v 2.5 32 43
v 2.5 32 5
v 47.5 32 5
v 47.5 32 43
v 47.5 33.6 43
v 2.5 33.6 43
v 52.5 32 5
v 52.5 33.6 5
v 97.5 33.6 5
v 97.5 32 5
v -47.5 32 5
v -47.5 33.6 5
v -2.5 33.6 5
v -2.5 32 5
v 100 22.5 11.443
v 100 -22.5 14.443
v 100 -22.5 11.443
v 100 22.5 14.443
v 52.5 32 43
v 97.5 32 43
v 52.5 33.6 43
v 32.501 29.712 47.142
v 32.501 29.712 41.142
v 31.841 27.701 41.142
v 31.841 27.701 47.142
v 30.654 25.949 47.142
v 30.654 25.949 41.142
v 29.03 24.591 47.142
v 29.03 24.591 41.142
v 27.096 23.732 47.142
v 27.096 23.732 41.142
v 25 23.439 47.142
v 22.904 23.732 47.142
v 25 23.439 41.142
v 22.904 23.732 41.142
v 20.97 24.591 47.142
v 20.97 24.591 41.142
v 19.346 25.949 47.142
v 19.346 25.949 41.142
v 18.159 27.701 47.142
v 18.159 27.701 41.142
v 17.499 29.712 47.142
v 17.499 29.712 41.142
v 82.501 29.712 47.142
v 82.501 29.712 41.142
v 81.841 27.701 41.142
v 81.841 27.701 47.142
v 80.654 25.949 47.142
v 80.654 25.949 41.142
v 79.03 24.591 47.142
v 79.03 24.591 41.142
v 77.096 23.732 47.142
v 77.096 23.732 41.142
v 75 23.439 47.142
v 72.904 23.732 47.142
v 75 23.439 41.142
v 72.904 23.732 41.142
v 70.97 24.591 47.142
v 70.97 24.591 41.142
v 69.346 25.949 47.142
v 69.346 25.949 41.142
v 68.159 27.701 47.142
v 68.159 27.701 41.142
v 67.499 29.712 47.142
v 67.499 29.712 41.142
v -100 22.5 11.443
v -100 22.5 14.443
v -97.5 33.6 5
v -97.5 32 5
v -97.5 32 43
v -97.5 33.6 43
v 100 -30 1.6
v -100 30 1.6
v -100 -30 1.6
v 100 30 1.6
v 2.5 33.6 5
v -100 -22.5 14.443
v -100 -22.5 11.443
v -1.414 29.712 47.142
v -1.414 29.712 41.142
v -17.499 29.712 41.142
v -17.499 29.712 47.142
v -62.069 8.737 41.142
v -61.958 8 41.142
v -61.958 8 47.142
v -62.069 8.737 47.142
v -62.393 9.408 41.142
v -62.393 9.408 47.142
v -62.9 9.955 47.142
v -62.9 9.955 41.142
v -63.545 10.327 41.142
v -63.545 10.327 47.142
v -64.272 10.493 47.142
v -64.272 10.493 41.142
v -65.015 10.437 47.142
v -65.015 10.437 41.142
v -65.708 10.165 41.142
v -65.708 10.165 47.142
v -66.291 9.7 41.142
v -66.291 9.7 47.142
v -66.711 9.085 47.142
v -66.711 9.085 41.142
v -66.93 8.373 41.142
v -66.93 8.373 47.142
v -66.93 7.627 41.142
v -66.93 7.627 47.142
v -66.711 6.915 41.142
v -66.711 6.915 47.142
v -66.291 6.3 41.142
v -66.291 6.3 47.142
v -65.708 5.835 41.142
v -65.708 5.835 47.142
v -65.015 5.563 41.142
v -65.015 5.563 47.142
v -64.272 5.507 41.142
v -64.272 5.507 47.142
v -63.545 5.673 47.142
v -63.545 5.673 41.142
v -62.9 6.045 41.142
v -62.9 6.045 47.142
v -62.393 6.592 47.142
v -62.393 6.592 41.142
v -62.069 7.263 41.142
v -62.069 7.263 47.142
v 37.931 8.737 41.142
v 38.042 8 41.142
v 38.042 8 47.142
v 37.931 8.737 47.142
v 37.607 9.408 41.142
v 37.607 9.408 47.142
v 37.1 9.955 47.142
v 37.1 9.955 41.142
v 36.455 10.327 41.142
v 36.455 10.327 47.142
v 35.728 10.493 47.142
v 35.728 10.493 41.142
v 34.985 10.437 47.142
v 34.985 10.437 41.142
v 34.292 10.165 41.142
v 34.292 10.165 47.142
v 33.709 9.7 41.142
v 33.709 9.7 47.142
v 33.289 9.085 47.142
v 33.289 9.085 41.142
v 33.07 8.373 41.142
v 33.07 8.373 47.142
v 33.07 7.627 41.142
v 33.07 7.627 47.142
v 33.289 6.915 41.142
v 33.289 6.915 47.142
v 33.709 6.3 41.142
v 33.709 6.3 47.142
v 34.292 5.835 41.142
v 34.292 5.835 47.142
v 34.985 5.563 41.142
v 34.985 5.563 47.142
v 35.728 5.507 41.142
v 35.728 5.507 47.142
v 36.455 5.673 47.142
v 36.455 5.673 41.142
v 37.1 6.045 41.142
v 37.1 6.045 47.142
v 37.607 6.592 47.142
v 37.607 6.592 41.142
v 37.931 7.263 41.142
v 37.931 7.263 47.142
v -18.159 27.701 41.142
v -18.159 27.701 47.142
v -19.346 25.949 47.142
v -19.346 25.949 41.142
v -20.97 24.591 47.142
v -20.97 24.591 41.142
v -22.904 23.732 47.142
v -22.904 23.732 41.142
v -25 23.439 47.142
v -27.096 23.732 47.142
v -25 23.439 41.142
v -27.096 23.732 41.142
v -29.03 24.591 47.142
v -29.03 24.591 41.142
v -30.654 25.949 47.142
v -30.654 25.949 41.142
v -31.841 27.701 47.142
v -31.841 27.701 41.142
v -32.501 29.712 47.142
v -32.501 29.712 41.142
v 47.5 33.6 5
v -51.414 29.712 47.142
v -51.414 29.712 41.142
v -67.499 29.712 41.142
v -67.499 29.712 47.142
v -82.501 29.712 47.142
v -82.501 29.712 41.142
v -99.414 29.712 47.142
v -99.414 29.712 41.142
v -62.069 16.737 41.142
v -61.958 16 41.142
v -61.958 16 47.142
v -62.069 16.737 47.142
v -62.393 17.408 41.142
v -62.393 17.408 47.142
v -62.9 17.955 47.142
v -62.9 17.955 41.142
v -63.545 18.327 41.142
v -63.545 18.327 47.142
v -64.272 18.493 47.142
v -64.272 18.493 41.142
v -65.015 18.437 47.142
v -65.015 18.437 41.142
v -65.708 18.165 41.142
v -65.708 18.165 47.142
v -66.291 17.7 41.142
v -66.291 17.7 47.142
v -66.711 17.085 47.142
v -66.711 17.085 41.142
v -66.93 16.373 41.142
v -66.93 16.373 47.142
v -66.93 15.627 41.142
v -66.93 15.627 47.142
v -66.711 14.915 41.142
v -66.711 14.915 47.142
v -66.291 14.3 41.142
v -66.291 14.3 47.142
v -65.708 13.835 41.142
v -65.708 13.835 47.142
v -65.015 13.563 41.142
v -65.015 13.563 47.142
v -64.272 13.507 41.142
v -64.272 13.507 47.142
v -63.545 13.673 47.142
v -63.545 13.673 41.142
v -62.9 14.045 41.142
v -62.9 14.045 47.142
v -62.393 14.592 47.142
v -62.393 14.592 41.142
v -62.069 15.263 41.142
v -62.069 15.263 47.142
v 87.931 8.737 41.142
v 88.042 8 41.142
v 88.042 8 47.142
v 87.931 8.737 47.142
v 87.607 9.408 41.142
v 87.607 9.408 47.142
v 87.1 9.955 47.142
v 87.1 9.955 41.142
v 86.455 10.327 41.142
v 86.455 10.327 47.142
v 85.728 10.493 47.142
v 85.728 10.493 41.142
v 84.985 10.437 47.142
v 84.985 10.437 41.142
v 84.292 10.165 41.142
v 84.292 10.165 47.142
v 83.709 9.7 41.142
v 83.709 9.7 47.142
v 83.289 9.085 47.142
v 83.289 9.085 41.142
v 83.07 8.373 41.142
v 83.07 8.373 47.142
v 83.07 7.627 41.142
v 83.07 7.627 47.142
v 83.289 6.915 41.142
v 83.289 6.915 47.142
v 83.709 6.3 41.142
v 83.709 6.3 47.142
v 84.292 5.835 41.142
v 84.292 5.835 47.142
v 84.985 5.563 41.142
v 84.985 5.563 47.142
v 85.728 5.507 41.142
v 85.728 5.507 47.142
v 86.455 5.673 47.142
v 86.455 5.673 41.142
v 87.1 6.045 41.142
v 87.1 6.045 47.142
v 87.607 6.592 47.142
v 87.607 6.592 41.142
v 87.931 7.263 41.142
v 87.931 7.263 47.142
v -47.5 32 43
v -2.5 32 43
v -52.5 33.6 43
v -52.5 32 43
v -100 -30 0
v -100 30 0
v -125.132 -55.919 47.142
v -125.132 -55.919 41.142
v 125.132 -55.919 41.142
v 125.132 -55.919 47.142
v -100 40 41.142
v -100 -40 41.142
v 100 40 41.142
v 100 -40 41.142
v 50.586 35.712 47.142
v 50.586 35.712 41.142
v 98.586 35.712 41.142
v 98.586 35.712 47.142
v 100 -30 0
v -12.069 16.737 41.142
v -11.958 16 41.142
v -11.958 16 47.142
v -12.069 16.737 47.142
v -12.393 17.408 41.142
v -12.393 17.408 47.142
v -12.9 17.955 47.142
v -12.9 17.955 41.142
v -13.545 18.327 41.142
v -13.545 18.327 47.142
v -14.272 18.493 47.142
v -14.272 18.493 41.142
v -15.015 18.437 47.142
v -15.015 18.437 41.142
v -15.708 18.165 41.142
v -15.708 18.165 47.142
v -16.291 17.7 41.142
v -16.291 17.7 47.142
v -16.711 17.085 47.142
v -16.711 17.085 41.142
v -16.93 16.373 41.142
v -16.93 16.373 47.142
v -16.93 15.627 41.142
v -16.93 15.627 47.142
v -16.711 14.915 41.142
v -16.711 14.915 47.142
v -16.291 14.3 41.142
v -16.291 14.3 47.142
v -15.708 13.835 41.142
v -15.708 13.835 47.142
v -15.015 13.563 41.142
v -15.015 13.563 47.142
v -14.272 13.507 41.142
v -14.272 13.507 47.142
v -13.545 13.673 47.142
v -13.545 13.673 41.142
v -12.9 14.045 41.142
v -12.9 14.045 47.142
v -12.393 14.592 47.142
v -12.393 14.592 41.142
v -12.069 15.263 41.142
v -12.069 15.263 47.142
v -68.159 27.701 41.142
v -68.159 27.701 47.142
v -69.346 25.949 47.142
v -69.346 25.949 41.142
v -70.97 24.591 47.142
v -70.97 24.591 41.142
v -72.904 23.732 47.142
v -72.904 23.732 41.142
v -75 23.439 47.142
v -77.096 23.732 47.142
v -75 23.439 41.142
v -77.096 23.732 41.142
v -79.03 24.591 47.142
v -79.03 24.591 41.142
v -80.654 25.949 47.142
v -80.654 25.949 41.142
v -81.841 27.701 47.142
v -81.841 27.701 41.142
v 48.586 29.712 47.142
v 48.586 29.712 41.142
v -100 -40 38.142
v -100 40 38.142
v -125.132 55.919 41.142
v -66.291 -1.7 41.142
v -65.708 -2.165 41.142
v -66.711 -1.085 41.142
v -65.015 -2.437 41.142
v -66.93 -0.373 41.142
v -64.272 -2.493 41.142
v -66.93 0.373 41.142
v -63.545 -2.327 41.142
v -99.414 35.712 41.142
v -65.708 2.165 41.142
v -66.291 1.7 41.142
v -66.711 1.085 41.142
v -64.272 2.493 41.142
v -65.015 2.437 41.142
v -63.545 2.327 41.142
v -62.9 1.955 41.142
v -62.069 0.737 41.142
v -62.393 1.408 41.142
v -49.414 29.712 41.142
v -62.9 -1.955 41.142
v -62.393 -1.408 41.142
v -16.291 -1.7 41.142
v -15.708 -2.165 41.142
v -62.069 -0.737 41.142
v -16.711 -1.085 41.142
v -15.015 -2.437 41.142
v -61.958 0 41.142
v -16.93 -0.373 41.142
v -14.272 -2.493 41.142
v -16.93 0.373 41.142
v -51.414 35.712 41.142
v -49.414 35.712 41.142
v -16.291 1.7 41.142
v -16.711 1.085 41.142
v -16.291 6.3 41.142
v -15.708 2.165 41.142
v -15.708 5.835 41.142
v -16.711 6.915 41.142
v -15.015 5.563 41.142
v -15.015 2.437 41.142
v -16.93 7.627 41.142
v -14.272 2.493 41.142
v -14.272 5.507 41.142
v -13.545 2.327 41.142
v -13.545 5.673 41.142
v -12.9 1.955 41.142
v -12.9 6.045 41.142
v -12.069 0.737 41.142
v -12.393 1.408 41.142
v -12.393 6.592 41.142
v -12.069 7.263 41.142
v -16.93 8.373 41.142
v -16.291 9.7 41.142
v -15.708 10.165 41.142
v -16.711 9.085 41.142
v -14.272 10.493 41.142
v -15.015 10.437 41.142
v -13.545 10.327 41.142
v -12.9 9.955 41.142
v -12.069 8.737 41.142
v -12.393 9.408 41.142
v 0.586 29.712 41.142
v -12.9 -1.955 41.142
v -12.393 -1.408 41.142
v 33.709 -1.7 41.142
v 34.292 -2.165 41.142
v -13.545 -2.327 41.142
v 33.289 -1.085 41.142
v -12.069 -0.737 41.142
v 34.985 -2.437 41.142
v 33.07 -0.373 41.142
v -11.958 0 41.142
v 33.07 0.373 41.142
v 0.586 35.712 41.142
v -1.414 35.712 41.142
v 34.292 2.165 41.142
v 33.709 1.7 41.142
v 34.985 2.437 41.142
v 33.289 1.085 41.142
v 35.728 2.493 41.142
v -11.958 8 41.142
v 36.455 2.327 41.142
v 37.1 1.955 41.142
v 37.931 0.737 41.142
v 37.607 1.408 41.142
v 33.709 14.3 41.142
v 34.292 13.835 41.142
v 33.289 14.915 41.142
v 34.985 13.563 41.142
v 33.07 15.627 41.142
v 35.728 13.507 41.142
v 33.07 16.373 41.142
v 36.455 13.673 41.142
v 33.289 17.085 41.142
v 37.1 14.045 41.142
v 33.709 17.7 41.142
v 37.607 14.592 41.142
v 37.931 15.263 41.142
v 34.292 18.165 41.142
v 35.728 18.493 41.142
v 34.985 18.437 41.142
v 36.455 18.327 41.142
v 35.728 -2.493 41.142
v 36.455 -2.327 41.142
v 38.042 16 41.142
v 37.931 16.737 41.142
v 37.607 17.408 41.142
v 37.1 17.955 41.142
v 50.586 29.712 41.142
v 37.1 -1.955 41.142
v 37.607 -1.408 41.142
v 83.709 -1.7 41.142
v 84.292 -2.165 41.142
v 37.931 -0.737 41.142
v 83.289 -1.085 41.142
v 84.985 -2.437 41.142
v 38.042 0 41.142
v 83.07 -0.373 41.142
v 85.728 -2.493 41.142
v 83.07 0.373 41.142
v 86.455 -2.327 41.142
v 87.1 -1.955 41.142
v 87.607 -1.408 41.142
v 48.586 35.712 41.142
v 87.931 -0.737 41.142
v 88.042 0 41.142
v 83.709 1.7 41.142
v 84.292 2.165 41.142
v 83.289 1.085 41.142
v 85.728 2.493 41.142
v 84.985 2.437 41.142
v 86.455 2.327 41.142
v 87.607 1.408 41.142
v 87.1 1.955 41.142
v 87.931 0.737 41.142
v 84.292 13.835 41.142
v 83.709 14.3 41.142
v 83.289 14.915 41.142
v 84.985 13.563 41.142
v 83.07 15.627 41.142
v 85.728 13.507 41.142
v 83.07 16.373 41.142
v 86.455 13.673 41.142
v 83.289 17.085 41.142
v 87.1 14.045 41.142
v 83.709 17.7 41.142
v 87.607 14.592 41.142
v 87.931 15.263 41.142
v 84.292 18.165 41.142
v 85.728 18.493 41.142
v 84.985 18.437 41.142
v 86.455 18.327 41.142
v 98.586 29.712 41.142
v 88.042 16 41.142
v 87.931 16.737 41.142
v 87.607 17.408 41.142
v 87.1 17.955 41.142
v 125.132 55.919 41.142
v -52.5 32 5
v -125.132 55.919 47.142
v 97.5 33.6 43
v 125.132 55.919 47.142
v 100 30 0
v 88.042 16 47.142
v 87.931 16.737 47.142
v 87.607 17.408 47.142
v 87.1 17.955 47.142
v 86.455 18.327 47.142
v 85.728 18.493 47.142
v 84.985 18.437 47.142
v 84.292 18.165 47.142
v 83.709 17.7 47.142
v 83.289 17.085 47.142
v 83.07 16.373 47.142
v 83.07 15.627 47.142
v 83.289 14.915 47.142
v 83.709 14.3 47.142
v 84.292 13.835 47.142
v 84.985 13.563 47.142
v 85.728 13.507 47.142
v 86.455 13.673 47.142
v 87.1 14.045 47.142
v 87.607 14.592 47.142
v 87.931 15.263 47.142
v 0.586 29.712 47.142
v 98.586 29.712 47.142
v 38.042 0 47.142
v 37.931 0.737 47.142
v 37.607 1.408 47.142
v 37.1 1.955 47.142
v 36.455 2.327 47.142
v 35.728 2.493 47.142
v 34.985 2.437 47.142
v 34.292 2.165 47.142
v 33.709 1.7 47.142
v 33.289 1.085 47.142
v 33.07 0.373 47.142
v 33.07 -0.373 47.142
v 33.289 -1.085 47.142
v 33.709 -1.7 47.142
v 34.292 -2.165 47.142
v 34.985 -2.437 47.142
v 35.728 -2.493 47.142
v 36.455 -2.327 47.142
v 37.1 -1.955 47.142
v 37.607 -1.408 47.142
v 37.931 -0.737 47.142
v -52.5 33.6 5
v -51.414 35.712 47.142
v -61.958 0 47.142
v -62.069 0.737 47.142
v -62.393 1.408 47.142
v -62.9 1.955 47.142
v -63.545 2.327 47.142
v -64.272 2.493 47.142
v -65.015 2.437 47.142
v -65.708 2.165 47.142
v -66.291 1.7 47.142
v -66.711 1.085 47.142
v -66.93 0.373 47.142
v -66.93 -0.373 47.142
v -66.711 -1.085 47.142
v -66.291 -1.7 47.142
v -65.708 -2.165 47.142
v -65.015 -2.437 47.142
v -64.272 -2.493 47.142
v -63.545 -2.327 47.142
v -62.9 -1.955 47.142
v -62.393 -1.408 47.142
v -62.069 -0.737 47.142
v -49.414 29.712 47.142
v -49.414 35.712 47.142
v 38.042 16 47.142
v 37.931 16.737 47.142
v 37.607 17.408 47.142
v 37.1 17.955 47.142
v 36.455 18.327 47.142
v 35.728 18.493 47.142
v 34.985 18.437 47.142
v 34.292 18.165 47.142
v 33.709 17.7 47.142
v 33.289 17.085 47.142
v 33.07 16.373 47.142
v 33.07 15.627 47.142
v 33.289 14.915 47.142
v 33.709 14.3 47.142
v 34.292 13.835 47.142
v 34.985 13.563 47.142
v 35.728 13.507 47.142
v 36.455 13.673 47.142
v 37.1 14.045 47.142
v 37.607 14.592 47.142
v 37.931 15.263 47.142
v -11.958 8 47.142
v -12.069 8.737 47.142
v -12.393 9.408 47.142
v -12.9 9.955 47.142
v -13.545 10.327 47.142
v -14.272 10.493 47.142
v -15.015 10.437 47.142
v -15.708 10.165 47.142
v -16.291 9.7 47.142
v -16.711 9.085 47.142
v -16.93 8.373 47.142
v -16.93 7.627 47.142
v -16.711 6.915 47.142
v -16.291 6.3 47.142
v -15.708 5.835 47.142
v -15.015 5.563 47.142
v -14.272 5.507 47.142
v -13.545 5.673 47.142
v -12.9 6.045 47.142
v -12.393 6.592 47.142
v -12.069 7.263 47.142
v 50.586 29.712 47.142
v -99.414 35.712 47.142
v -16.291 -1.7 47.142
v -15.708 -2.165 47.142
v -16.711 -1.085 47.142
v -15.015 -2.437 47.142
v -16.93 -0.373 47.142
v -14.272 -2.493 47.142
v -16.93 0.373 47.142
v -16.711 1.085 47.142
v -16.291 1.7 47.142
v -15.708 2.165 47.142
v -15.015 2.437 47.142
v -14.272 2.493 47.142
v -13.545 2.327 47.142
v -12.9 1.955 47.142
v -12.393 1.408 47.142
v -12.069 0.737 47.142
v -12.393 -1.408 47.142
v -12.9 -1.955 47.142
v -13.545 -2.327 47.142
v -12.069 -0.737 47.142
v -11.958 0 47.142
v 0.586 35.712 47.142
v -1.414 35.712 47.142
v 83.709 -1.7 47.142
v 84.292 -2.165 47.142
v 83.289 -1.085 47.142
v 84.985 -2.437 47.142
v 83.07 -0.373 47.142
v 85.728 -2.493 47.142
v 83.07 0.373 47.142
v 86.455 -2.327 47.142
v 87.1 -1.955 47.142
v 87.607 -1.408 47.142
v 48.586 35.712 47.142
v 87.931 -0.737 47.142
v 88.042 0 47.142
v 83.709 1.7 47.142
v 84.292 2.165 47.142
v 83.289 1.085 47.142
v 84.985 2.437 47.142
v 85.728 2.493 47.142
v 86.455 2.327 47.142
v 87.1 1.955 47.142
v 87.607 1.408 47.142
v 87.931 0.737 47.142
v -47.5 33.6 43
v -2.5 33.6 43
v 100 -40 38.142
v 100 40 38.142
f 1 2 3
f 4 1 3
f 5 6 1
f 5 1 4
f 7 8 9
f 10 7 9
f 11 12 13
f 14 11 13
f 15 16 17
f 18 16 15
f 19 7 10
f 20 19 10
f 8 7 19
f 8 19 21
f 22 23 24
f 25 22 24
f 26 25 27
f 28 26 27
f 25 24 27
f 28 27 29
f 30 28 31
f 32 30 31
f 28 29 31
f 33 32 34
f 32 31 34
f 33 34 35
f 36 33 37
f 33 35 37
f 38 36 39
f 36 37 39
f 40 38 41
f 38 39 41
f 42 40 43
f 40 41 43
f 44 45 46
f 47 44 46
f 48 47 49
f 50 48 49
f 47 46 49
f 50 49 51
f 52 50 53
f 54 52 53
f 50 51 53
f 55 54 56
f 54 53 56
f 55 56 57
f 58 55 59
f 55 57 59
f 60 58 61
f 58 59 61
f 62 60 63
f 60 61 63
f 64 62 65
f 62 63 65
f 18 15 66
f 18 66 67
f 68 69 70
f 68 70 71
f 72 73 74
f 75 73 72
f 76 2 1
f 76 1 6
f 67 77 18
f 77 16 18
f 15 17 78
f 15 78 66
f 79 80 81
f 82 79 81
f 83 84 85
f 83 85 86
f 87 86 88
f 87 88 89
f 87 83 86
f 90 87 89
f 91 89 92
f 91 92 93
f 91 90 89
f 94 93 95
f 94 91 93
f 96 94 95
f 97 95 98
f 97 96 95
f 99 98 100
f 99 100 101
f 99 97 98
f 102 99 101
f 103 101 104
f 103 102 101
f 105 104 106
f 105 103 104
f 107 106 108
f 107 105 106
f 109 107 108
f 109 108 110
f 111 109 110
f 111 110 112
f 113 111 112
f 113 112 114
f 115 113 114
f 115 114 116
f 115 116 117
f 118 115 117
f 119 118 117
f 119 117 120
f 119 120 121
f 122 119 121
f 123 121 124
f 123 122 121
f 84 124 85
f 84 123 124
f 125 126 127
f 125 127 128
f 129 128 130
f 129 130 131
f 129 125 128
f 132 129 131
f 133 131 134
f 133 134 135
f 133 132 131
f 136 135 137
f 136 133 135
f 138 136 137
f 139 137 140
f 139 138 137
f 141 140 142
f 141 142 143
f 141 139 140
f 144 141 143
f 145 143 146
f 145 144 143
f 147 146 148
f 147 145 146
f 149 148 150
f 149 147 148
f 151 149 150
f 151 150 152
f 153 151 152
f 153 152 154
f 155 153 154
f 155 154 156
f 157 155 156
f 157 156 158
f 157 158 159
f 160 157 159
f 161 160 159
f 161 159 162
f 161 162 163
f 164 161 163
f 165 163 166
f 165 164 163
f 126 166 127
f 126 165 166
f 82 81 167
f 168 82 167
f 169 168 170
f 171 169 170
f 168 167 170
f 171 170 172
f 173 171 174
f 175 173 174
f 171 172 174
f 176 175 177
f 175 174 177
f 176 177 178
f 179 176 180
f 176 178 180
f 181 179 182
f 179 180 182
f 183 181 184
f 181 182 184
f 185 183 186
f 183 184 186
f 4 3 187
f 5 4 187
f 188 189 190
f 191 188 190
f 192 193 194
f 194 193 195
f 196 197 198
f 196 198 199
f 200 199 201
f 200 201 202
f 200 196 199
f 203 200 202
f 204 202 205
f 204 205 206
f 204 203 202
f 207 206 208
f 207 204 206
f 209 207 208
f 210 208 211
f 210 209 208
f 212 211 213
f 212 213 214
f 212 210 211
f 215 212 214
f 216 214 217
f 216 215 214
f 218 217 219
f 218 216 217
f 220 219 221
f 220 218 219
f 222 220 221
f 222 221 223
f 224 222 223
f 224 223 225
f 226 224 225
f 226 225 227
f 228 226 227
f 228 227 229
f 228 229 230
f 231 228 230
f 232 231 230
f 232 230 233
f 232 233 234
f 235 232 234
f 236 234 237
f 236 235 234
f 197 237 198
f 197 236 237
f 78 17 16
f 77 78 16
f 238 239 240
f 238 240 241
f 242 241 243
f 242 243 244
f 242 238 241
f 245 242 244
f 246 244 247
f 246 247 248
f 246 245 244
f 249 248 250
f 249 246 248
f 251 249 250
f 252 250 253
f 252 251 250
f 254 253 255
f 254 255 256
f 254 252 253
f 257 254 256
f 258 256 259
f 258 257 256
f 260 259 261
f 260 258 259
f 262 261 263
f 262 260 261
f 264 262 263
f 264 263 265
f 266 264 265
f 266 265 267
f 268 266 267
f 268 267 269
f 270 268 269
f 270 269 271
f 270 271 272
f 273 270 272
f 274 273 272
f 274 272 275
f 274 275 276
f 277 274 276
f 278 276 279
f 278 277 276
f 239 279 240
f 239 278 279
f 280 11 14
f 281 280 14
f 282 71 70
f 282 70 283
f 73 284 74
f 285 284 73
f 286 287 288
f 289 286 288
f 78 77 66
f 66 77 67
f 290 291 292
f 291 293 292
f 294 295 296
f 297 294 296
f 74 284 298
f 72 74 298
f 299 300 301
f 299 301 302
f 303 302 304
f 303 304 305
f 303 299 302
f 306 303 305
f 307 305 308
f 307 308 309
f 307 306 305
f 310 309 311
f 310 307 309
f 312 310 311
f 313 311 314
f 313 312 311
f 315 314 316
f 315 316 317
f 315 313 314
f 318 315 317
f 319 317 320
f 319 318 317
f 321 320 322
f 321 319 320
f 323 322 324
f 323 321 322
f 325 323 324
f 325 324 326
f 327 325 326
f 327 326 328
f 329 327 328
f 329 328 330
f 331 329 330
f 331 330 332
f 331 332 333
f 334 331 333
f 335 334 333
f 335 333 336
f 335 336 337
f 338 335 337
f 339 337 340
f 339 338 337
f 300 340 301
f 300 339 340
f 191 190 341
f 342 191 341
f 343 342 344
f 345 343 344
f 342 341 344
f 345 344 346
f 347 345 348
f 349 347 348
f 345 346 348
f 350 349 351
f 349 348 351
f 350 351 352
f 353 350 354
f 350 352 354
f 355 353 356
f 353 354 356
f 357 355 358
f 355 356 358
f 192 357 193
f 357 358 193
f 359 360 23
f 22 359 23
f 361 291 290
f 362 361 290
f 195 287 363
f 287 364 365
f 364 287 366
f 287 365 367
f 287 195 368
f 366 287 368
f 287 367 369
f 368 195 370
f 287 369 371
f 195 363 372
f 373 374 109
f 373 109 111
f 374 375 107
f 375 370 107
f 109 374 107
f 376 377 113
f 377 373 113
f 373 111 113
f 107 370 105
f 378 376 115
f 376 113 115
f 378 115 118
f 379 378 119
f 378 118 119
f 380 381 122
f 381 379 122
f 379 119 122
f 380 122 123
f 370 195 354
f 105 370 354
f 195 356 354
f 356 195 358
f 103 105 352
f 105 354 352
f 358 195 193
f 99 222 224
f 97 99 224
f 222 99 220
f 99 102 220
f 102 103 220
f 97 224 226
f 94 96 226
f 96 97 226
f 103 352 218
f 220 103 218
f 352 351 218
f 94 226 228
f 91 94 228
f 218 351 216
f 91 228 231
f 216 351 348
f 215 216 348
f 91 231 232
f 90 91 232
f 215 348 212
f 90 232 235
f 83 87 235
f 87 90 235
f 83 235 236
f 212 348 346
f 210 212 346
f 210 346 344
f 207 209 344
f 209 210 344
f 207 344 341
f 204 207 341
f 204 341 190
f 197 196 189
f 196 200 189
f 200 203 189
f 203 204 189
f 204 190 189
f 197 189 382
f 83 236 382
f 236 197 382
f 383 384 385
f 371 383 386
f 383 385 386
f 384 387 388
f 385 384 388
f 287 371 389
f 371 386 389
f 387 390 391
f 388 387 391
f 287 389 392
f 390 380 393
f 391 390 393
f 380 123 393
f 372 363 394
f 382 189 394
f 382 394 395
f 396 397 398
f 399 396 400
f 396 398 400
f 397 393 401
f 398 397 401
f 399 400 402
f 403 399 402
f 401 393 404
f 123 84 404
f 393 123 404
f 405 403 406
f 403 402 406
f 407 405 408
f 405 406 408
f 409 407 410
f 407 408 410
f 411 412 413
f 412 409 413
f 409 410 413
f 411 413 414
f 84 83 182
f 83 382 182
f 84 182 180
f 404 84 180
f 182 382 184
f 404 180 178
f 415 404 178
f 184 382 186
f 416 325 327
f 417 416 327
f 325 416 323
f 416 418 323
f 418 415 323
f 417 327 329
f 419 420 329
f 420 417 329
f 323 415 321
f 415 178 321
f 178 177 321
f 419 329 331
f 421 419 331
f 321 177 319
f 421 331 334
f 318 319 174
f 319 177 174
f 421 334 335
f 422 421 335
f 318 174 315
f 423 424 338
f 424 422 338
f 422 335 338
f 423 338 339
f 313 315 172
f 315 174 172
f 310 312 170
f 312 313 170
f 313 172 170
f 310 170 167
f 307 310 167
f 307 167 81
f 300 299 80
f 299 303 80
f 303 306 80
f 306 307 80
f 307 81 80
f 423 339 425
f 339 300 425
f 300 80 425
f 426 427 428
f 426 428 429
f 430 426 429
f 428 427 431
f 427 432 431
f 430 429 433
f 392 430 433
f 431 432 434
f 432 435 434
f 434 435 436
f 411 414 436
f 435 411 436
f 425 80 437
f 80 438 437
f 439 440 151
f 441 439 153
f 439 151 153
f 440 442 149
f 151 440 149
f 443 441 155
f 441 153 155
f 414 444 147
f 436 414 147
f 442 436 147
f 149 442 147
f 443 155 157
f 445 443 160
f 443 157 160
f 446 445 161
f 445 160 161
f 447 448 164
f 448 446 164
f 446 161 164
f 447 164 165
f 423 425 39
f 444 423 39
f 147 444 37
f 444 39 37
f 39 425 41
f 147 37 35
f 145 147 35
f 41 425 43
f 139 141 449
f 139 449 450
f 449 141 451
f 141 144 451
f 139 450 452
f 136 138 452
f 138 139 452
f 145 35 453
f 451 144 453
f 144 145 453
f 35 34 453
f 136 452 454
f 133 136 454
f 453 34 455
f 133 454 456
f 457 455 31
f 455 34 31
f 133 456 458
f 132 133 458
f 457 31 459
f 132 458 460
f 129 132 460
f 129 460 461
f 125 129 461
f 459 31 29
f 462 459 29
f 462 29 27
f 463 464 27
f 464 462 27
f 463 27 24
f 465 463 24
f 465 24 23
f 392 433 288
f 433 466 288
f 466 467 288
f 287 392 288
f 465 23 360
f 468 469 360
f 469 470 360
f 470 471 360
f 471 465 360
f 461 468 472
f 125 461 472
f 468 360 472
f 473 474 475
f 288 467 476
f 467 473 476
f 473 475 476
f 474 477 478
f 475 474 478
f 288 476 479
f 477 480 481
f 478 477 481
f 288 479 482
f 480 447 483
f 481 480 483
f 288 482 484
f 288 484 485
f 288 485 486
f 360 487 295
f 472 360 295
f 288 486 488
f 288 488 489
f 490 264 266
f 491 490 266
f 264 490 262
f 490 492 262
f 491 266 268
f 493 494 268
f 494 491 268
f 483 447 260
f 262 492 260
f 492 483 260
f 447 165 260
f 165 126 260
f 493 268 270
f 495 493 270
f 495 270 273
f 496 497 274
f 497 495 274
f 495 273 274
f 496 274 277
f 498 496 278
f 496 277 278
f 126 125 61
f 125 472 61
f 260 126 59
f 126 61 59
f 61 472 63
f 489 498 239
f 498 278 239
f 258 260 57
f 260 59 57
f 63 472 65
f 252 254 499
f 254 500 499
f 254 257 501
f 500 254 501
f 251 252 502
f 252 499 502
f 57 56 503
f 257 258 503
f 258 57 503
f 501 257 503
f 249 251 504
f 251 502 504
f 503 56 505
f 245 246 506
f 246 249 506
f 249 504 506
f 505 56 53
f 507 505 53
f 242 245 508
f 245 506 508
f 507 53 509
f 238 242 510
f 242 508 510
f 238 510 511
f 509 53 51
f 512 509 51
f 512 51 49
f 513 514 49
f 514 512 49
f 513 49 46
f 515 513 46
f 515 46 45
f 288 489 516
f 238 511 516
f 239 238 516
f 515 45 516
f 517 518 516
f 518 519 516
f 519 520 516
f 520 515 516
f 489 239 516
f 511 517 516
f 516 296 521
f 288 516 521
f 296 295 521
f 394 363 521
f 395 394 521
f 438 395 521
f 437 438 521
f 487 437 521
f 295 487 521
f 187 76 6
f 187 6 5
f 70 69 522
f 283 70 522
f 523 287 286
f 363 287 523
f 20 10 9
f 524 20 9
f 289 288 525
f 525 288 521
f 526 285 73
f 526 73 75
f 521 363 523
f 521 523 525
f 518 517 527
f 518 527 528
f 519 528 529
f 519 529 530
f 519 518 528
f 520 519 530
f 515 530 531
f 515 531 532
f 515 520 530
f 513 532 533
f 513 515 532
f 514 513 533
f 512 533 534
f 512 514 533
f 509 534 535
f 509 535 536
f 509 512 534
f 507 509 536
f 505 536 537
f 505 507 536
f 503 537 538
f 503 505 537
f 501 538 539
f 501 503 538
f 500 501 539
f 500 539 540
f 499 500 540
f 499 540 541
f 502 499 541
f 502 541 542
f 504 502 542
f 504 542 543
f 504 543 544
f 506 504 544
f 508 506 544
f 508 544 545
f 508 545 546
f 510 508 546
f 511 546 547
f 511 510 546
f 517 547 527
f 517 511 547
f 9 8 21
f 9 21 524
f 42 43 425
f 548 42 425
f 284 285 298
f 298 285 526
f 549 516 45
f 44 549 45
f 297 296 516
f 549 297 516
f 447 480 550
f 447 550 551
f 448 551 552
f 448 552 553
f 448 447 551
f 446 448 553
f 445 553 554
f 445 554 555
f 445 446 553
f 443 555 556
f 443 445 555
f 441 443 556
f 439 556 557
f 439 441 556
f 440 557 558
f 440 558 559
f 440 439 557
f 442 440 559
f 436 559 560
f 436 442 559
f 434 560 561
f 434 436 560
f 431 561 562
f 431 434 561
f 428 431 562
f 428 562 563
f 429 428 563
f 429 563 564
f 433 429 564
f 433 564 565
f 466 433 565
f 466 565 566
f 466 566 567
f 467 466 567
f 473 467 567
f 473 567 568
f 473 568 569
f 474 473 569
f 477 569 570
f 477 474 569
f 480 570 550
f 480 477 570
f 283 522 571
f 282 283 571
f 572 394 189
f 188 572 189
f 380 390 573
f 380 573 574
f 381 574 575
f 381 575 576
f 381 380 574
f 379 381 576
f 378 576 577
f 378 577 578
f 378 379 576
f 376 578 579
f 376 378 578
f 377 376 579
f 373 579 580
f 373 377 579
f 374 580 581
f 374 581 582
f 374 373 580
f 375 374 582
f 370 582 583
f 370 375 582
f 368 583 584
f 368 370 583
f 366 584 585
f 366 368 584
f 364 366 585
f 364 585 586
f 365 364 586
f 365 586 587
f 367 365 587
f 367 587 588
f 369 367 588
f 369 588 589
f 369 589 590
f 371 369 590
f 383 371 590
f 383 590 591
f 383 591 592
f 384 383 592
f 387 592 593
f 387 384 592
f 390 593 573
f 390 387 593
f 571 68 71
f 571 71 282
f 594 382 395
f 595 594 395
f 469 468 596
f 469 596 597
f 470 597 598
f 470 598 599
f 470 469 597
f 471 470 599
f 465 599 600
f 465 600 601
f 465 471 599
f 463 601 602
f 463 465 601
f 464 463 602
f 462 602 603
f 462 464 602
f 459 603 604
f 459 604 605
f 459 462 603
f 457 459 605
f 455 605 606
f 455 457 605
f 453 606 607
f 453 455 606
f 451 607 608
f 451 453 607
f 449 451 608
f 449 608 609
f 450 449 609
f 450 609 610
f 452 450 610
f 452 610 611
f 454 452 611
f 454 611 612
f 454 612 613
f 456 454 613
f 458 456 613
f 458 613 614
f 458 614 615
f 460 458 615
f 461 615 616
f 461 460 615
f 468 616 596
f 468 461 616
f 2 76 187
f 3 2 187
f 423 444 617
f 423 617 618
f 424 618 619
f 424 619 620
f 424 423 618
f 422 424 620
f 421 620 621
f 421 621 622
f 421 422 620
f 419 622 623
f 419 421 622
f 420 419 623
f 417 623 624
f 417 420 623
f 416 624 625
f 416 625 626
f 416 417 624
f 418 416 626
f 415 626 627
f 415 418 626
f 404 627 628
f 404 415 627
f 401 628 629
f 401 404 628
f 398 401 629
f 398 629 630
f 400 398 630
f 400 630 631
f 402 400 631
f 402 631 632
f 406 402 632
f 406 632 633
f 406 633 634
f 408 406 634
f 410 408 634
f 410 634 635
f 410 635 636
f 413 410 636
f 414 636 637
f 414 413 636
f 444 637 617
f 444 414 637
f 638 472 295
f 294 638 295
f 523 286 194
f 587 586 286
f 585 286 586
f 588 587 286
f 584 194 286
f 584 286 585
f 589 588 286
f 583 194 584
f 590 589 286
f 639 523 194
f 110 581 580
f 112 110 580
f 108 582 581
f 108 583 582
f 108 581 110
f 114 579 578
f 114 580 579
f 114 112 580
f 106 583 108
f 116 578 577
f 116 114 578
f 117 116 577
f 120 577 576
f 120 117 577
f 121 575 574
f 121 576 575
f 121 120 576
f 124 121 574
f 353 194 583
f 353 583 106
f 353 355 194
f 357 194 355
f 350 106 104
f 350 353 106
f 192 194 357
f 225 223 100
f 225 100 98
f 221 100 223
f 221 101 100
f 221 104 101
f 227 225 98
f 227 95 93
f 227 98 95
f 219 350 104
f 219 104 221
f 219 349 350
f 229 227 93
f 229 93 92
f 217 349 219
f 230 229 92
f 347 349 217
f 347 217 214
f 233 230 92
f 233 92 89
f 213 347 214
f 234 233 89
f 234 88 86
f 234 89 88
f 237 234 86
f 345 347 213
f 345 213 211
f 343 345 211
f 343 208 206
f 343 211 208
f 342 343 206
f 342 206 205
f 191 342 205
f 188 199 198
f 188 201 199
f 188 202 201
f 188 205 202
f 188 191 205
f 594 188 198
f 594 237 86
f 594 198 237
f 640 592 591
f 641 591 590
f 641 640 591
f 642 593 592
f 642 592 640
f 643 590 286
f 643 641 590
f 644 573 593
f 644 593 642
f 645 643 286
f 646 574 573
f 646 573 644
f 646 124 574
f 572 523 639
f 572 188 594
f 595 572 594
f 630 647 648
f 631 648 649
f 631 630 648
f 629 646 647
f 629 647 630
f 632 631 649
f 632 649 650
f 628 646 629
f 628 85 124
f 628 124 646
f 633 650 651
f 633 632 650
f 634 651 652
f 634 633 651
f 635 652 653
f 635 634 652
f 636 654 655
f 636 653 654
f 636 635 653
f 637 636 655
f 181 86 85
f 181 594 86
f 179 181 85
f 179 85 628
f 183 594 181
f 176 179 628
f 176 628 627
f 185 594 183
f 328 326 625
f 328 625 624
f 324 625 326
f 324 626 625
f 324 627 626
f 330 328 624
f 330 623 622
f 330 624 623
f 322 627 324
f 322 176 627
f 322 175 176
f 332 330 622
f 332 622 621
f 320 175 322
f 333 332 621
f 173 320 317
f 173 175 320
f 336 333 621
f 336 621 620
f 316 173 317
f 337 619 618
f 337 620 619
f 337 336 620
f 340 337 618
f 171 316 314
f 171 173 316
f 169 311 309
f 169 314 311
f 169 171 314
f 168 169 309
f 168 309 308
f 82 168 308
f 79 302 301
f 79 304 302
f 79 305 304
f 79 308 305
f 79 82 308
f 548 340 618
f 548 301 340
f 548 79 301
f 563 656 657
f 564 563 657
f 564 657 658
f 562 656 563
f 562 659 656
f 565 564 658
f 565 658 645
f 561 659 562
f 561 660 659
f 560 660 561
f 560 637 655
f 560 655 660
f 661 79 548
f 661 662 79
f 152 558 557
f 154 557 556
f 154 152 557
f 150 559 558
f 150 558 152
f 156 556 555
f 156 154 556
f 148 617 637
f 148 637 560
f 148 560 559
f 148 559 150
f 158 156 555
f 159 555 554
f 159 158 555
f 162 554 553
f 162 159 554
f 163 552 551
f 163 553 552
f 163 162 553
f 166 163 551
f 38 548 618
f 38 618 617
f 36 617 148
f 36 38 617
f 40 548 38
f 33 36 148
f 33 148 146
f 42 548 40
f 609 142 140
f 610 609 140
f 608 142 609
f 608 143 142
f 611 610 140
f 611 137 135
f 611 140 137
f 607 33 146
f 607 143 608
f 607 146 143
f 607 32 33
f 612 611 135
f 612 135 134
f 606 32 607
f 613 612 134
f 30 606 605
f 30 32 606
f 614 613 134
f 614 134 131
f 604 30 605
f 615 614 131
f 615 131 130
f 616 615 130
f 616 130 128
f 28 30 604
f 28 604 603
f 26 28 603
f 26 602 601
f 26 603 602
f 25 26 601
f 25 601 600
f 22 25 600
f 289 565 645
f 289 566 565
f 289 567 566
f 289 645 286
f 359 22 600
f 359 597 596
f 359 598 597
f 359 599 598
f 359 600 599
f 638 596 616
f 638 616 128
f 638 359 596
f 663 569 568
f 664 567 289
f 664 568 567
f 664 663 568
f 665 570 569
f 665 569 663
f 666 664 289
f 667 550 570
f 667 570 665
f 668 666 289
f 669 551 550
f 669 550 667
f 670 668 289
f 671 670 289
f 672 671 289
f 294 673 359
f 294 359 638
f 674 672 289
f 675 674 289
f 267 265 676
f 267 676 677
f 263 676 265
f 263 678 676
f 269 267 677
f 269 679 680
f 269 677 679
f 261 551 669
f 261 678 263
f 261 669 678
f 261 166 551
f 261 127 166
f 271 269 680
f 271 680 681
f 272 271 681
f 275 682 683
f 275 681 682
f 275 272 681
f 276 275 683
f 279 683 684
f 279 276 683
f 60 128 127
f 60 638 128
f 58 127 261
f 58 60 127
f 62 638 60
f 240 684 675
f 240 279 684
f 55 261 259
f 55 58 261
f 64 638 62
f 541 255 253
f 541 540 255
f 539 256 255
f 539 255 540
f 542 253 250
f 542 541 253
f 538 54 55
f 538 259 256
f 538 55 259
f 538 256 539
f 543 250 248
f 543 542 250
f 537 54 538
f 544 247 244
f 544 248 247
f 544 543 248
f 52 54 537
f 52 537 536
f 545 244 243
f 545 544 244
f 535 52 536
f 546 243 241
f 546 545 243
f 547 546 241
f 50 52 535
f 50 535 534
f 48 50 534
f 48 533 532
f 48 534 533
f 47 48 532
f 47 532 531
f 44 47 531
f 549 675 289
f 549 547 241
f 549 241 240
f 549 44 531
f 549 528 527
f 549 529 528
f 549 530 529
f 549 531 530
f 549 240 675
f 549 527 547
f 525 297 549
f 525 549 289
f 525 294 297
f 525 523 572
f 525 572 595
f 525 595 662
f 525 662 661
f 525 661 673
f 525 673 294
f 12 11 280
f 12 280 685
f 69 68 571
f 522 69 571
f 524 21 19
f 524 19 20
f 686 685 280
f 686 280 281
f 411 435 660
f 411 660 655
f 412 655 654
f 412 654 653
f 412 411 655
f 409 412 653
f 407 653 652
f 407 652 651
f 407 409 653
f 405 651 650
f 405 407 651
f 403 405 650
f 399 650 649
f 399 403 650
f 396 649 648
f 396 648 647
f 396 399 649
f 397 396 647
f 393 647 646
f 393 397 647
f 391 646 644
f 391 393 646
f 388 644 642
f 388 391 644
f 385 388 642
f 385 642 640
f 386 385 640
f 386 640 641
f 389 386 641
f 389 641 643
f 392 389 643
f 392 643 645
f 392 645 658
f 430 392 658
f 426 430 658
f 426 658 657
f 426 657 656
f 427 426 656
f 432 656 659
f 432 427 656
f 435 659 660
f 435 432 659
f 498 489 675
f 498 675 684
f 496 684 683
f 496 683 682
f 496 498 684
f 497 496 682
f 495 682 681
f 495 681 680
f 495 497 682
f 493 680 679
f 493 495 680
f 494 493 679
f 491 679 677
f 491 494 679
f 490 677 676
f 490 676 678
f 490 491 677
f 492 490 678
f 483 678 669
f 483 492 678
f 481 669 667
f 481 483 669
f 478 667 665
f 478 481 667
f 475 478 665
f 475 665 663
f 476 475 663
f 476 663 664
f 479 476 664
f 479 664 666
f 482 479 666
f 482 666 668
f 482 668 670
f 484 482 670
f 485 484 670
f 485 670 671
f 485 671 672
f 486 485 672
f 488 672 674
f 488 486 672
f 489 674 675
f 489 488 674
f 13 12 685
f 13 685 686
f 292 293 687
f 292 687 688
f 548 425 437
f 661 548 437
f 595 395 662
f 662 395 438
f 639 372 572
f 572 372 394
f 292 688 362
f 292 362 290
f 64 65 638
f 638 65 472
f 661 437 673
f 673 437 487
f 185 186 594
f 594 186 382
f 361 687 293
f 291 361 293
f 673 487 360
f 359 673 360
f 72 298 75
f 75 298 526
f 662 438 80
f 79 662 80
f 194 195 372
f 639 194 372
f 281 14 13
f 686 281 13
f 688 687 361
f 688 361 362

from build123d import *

# Parameters (mm, degrees)
F0_W          = 200
F0_H          = 60
F1_DEPTH      = 1.6
F3_START      = 5
F2_W          = 45
F2_H          = 1.6
F3_DEPTH      = 38
F4_W          = 45
F4_H          = 3
F5_DEPTH      = 100
F5_DEPTH_BACK = 100
F4_W_2        = 80
F6_W          = 250.26460653
F6_H          = 111.8382608923
F6_R          = 2.5
F7_DEPTH      = 6


with BuildPart() as f1:
    # F0 (on Top) → F1 (new body)
    with BuildSketch(Plane.XY):
        Rectangle(F0_W, F0_H)
    extrude(amount=F1_DEPTH)


with BuildPart() as f3:
    # F2 (on Top) → F3 (new body)
    with BuildSketch(Plane.XY.offset(F3_START)):
        with Locations((-75, 32.8)):
            Rectangle(F2_W, F2_H)
    extrude(amount=F3_DEPTH)


with BuildPart() as f3b:
    # F2 (on Top) → F3, piece 2 (new body)
    with BuildSketch(Plane.XY.offset(F3_START)):
        with Locations((-25, 32.8)):
            Rectangle(F2_W, F2_H)
    extrude(amount=F3_DEPTH)


with BuildPart() as f3c:
    # F2 (on Top) → F3, piece 3 (new body)
    with BuildSketch(Plane.XY.offset(F3_START)):
        with Locations((25, 32.8)):
            Rectangle(F2_W, F2_H)
    extrude(amount=F3_DEPTH)


with BuildPart() as f3d:
    # F2 (on Top) → F3, piece 4 (new body)
    with BuildSketch(Plane.XY.offset(F3_START)):
        with Locations((75, 32.8)):
            Rectangle(F2_W, F2_H)
    extrude(amount=F3_DEPTH)


with BuildPart() as f5:
    # F4 (on Right) → F5 (new body, two sides)
    with BuildSketch(Plane.YZ) as f5_sk:
        with Locations((0, 12.9431548645)):
            Rectangle(F4_W, F4_H)
    extrude(amount=F5_DEPTH)
    extrude(f5_sk.sketch, amount=-F5_DEPTH_BACK)


with BuildPart() as f5b:
    # F4 (on Right) → F5, piece 2 (new body, two sides)
    with BuildSketch(Plane.YZ) as f5_2_sk:
        with Locations((0, 39.642252028)):
            Rectangle(F4_W_2, F4_H)
    extrude(amount=F5_DEPTH)
    extrude(f5_2_sk.sketch, amount=-F5_DEPTH_BACK)


with BuildPart() as f7:
    # F6 (on face) → F7 (new body)
    with BuildSketch(Plane.XY.offset(41.142252028)):
        Rectangle(F6_W, F6_H)
        with Locations((-64.4584000111, 0)):
            Circle(F6_R, mode=Mode.SUBTRACT)
        with Locations((-64.4584000111, 8)):
            Circle(F6_R, mode=Mode.SUBTRACT)
        with Locations((-64.4584000111, 16)):
            Circle(F6_R, mode=Mode.SUBTRACT)
        with Locations((-14.4584000111, 0)):
            Circle(F6_R, mode=Mode.SUBTRACT)
        with Locations((-14.4584000111, 8)):
            Circle(F6_R, mode=Mode.SUBTRACT)
        with Locations((-14.4584000111, 16)):
            Circle(F6_R, mode=Mode.SUBTRACT)
        with BuildLine():
            Line((-99.413959682, 35.7116325498), (-51.413959682, 35.7116325498))
            Line((-51.413959682, 35.7116325498), (-51.413959682, 29.7116325498))
            Line((-51.413959682, 29.7116325498), (-67.4987107515, 29.7116325498))
            ThreePointArc((-67.4987107515, 29.7116325498), (-75, 23.4385324077), (-82.5012892485, 29.7116325498))
            Line((-82.5012892485, 29.7116325498), (-99.413959682, 29.7116325498))
            Line((-99.413959682, 29.7116325498), (-99.413959682, 35.7116325498))
        make_face(mode=Mode.SUBTRACT)
        with BuildLine():
            Line((-1.413959682, 35.7116325498), (-1.413959682, 29.7116325498))
            Line((-1.413959682, 29.7116325498), (-17.4987107515, 29.7116325498))
            ThreePointArc((-17.4987107515, 29.7116325498), (-25, 23.4385324077), (-32.5012892485, 29.7116325498))
            Line((-32.5012892485, 29.7116325498), (-49.413959682, 29.7116325498))
            Line((-49.413959682, 29.7116325498), (-49.413959682, 35.7116325498))
            Line((-49.413959682, 35.7116325498), (-1.413959682, 35.7116325498))
        make_face(mode=Mode.SUBTRACT)
        with Locations((35.5415999889, 0)):
            Circle(F6_R, mode=Mode.SUBTRACT)
        with Locations((35.5415999889, 8)):
            Circle(F6_R, mode=Mode.SUBTRACT)
        with Locations((35.5415999889, 16)):
            Circle(F6_R, mode=Mode.SUBTRACT)
        with Locations((85.5415999889, 0)):
            Circle(F6_R, mode=Mode.SUBTRACT)
        with Locations((85.5415999889, 8)):
            Circle(F6_R, mode=Mode.SUBTRACT)
        with Locations((85.5415999889, 16)):
            Circle(F6_R, mode=Mode.SUBTRACT)
        with BuildLine():
            Line((48.586040318, 35.7116325498), (48.586040318, 29.7116325498))
            Line((48.586040318, 29.7116325498), (32.5012892485, 29.7116325498))
            ThreePointArc((32.5012892485, 29.7116325498), (25, 23.4385324077), (17.4987107515, 29.7116325498))
            Line((17.4987107515, 29.7116325498), (0.586040318, 29.7116325498))
            Line((0.586040318, 29.7116325498), (0.586040318, 35.7116325498))
            Line((0.586040318, 35.7116325498), (48.586040318, 35.7116325498))
        make_face(mode=Mode.SUBTRACT)
        with BuildLine():
            Line((98.586040318, 35.7116325498), (98.586040318, 29.7116325498))
            Line((98.586040318, 29.7116325498), (82.5012892485, 29.7116325498))
            ThreePointArc((82.5012892485, 29.7116325498), (75, 23.4385324077), (67.4987107515, 29.7116325498))
            Line((67.4987107515, 29.7116325498), (50.586040318, 29.7116325498))
            Line((50.586040318, 29.7116325498), (50.586040318, 35.7116325498))
            Line((50.586040318, 35.7116325498), (98.586040318, 35.7116325498))
        make_face(mode=Mode.SUBTRACT)
    extrude(amount=F7_DEPTH)


solid = Compound([f1.part, f3.part, f3b.part, f3c.part, f3d.part, f5.part, f5b.part, f7.part])
